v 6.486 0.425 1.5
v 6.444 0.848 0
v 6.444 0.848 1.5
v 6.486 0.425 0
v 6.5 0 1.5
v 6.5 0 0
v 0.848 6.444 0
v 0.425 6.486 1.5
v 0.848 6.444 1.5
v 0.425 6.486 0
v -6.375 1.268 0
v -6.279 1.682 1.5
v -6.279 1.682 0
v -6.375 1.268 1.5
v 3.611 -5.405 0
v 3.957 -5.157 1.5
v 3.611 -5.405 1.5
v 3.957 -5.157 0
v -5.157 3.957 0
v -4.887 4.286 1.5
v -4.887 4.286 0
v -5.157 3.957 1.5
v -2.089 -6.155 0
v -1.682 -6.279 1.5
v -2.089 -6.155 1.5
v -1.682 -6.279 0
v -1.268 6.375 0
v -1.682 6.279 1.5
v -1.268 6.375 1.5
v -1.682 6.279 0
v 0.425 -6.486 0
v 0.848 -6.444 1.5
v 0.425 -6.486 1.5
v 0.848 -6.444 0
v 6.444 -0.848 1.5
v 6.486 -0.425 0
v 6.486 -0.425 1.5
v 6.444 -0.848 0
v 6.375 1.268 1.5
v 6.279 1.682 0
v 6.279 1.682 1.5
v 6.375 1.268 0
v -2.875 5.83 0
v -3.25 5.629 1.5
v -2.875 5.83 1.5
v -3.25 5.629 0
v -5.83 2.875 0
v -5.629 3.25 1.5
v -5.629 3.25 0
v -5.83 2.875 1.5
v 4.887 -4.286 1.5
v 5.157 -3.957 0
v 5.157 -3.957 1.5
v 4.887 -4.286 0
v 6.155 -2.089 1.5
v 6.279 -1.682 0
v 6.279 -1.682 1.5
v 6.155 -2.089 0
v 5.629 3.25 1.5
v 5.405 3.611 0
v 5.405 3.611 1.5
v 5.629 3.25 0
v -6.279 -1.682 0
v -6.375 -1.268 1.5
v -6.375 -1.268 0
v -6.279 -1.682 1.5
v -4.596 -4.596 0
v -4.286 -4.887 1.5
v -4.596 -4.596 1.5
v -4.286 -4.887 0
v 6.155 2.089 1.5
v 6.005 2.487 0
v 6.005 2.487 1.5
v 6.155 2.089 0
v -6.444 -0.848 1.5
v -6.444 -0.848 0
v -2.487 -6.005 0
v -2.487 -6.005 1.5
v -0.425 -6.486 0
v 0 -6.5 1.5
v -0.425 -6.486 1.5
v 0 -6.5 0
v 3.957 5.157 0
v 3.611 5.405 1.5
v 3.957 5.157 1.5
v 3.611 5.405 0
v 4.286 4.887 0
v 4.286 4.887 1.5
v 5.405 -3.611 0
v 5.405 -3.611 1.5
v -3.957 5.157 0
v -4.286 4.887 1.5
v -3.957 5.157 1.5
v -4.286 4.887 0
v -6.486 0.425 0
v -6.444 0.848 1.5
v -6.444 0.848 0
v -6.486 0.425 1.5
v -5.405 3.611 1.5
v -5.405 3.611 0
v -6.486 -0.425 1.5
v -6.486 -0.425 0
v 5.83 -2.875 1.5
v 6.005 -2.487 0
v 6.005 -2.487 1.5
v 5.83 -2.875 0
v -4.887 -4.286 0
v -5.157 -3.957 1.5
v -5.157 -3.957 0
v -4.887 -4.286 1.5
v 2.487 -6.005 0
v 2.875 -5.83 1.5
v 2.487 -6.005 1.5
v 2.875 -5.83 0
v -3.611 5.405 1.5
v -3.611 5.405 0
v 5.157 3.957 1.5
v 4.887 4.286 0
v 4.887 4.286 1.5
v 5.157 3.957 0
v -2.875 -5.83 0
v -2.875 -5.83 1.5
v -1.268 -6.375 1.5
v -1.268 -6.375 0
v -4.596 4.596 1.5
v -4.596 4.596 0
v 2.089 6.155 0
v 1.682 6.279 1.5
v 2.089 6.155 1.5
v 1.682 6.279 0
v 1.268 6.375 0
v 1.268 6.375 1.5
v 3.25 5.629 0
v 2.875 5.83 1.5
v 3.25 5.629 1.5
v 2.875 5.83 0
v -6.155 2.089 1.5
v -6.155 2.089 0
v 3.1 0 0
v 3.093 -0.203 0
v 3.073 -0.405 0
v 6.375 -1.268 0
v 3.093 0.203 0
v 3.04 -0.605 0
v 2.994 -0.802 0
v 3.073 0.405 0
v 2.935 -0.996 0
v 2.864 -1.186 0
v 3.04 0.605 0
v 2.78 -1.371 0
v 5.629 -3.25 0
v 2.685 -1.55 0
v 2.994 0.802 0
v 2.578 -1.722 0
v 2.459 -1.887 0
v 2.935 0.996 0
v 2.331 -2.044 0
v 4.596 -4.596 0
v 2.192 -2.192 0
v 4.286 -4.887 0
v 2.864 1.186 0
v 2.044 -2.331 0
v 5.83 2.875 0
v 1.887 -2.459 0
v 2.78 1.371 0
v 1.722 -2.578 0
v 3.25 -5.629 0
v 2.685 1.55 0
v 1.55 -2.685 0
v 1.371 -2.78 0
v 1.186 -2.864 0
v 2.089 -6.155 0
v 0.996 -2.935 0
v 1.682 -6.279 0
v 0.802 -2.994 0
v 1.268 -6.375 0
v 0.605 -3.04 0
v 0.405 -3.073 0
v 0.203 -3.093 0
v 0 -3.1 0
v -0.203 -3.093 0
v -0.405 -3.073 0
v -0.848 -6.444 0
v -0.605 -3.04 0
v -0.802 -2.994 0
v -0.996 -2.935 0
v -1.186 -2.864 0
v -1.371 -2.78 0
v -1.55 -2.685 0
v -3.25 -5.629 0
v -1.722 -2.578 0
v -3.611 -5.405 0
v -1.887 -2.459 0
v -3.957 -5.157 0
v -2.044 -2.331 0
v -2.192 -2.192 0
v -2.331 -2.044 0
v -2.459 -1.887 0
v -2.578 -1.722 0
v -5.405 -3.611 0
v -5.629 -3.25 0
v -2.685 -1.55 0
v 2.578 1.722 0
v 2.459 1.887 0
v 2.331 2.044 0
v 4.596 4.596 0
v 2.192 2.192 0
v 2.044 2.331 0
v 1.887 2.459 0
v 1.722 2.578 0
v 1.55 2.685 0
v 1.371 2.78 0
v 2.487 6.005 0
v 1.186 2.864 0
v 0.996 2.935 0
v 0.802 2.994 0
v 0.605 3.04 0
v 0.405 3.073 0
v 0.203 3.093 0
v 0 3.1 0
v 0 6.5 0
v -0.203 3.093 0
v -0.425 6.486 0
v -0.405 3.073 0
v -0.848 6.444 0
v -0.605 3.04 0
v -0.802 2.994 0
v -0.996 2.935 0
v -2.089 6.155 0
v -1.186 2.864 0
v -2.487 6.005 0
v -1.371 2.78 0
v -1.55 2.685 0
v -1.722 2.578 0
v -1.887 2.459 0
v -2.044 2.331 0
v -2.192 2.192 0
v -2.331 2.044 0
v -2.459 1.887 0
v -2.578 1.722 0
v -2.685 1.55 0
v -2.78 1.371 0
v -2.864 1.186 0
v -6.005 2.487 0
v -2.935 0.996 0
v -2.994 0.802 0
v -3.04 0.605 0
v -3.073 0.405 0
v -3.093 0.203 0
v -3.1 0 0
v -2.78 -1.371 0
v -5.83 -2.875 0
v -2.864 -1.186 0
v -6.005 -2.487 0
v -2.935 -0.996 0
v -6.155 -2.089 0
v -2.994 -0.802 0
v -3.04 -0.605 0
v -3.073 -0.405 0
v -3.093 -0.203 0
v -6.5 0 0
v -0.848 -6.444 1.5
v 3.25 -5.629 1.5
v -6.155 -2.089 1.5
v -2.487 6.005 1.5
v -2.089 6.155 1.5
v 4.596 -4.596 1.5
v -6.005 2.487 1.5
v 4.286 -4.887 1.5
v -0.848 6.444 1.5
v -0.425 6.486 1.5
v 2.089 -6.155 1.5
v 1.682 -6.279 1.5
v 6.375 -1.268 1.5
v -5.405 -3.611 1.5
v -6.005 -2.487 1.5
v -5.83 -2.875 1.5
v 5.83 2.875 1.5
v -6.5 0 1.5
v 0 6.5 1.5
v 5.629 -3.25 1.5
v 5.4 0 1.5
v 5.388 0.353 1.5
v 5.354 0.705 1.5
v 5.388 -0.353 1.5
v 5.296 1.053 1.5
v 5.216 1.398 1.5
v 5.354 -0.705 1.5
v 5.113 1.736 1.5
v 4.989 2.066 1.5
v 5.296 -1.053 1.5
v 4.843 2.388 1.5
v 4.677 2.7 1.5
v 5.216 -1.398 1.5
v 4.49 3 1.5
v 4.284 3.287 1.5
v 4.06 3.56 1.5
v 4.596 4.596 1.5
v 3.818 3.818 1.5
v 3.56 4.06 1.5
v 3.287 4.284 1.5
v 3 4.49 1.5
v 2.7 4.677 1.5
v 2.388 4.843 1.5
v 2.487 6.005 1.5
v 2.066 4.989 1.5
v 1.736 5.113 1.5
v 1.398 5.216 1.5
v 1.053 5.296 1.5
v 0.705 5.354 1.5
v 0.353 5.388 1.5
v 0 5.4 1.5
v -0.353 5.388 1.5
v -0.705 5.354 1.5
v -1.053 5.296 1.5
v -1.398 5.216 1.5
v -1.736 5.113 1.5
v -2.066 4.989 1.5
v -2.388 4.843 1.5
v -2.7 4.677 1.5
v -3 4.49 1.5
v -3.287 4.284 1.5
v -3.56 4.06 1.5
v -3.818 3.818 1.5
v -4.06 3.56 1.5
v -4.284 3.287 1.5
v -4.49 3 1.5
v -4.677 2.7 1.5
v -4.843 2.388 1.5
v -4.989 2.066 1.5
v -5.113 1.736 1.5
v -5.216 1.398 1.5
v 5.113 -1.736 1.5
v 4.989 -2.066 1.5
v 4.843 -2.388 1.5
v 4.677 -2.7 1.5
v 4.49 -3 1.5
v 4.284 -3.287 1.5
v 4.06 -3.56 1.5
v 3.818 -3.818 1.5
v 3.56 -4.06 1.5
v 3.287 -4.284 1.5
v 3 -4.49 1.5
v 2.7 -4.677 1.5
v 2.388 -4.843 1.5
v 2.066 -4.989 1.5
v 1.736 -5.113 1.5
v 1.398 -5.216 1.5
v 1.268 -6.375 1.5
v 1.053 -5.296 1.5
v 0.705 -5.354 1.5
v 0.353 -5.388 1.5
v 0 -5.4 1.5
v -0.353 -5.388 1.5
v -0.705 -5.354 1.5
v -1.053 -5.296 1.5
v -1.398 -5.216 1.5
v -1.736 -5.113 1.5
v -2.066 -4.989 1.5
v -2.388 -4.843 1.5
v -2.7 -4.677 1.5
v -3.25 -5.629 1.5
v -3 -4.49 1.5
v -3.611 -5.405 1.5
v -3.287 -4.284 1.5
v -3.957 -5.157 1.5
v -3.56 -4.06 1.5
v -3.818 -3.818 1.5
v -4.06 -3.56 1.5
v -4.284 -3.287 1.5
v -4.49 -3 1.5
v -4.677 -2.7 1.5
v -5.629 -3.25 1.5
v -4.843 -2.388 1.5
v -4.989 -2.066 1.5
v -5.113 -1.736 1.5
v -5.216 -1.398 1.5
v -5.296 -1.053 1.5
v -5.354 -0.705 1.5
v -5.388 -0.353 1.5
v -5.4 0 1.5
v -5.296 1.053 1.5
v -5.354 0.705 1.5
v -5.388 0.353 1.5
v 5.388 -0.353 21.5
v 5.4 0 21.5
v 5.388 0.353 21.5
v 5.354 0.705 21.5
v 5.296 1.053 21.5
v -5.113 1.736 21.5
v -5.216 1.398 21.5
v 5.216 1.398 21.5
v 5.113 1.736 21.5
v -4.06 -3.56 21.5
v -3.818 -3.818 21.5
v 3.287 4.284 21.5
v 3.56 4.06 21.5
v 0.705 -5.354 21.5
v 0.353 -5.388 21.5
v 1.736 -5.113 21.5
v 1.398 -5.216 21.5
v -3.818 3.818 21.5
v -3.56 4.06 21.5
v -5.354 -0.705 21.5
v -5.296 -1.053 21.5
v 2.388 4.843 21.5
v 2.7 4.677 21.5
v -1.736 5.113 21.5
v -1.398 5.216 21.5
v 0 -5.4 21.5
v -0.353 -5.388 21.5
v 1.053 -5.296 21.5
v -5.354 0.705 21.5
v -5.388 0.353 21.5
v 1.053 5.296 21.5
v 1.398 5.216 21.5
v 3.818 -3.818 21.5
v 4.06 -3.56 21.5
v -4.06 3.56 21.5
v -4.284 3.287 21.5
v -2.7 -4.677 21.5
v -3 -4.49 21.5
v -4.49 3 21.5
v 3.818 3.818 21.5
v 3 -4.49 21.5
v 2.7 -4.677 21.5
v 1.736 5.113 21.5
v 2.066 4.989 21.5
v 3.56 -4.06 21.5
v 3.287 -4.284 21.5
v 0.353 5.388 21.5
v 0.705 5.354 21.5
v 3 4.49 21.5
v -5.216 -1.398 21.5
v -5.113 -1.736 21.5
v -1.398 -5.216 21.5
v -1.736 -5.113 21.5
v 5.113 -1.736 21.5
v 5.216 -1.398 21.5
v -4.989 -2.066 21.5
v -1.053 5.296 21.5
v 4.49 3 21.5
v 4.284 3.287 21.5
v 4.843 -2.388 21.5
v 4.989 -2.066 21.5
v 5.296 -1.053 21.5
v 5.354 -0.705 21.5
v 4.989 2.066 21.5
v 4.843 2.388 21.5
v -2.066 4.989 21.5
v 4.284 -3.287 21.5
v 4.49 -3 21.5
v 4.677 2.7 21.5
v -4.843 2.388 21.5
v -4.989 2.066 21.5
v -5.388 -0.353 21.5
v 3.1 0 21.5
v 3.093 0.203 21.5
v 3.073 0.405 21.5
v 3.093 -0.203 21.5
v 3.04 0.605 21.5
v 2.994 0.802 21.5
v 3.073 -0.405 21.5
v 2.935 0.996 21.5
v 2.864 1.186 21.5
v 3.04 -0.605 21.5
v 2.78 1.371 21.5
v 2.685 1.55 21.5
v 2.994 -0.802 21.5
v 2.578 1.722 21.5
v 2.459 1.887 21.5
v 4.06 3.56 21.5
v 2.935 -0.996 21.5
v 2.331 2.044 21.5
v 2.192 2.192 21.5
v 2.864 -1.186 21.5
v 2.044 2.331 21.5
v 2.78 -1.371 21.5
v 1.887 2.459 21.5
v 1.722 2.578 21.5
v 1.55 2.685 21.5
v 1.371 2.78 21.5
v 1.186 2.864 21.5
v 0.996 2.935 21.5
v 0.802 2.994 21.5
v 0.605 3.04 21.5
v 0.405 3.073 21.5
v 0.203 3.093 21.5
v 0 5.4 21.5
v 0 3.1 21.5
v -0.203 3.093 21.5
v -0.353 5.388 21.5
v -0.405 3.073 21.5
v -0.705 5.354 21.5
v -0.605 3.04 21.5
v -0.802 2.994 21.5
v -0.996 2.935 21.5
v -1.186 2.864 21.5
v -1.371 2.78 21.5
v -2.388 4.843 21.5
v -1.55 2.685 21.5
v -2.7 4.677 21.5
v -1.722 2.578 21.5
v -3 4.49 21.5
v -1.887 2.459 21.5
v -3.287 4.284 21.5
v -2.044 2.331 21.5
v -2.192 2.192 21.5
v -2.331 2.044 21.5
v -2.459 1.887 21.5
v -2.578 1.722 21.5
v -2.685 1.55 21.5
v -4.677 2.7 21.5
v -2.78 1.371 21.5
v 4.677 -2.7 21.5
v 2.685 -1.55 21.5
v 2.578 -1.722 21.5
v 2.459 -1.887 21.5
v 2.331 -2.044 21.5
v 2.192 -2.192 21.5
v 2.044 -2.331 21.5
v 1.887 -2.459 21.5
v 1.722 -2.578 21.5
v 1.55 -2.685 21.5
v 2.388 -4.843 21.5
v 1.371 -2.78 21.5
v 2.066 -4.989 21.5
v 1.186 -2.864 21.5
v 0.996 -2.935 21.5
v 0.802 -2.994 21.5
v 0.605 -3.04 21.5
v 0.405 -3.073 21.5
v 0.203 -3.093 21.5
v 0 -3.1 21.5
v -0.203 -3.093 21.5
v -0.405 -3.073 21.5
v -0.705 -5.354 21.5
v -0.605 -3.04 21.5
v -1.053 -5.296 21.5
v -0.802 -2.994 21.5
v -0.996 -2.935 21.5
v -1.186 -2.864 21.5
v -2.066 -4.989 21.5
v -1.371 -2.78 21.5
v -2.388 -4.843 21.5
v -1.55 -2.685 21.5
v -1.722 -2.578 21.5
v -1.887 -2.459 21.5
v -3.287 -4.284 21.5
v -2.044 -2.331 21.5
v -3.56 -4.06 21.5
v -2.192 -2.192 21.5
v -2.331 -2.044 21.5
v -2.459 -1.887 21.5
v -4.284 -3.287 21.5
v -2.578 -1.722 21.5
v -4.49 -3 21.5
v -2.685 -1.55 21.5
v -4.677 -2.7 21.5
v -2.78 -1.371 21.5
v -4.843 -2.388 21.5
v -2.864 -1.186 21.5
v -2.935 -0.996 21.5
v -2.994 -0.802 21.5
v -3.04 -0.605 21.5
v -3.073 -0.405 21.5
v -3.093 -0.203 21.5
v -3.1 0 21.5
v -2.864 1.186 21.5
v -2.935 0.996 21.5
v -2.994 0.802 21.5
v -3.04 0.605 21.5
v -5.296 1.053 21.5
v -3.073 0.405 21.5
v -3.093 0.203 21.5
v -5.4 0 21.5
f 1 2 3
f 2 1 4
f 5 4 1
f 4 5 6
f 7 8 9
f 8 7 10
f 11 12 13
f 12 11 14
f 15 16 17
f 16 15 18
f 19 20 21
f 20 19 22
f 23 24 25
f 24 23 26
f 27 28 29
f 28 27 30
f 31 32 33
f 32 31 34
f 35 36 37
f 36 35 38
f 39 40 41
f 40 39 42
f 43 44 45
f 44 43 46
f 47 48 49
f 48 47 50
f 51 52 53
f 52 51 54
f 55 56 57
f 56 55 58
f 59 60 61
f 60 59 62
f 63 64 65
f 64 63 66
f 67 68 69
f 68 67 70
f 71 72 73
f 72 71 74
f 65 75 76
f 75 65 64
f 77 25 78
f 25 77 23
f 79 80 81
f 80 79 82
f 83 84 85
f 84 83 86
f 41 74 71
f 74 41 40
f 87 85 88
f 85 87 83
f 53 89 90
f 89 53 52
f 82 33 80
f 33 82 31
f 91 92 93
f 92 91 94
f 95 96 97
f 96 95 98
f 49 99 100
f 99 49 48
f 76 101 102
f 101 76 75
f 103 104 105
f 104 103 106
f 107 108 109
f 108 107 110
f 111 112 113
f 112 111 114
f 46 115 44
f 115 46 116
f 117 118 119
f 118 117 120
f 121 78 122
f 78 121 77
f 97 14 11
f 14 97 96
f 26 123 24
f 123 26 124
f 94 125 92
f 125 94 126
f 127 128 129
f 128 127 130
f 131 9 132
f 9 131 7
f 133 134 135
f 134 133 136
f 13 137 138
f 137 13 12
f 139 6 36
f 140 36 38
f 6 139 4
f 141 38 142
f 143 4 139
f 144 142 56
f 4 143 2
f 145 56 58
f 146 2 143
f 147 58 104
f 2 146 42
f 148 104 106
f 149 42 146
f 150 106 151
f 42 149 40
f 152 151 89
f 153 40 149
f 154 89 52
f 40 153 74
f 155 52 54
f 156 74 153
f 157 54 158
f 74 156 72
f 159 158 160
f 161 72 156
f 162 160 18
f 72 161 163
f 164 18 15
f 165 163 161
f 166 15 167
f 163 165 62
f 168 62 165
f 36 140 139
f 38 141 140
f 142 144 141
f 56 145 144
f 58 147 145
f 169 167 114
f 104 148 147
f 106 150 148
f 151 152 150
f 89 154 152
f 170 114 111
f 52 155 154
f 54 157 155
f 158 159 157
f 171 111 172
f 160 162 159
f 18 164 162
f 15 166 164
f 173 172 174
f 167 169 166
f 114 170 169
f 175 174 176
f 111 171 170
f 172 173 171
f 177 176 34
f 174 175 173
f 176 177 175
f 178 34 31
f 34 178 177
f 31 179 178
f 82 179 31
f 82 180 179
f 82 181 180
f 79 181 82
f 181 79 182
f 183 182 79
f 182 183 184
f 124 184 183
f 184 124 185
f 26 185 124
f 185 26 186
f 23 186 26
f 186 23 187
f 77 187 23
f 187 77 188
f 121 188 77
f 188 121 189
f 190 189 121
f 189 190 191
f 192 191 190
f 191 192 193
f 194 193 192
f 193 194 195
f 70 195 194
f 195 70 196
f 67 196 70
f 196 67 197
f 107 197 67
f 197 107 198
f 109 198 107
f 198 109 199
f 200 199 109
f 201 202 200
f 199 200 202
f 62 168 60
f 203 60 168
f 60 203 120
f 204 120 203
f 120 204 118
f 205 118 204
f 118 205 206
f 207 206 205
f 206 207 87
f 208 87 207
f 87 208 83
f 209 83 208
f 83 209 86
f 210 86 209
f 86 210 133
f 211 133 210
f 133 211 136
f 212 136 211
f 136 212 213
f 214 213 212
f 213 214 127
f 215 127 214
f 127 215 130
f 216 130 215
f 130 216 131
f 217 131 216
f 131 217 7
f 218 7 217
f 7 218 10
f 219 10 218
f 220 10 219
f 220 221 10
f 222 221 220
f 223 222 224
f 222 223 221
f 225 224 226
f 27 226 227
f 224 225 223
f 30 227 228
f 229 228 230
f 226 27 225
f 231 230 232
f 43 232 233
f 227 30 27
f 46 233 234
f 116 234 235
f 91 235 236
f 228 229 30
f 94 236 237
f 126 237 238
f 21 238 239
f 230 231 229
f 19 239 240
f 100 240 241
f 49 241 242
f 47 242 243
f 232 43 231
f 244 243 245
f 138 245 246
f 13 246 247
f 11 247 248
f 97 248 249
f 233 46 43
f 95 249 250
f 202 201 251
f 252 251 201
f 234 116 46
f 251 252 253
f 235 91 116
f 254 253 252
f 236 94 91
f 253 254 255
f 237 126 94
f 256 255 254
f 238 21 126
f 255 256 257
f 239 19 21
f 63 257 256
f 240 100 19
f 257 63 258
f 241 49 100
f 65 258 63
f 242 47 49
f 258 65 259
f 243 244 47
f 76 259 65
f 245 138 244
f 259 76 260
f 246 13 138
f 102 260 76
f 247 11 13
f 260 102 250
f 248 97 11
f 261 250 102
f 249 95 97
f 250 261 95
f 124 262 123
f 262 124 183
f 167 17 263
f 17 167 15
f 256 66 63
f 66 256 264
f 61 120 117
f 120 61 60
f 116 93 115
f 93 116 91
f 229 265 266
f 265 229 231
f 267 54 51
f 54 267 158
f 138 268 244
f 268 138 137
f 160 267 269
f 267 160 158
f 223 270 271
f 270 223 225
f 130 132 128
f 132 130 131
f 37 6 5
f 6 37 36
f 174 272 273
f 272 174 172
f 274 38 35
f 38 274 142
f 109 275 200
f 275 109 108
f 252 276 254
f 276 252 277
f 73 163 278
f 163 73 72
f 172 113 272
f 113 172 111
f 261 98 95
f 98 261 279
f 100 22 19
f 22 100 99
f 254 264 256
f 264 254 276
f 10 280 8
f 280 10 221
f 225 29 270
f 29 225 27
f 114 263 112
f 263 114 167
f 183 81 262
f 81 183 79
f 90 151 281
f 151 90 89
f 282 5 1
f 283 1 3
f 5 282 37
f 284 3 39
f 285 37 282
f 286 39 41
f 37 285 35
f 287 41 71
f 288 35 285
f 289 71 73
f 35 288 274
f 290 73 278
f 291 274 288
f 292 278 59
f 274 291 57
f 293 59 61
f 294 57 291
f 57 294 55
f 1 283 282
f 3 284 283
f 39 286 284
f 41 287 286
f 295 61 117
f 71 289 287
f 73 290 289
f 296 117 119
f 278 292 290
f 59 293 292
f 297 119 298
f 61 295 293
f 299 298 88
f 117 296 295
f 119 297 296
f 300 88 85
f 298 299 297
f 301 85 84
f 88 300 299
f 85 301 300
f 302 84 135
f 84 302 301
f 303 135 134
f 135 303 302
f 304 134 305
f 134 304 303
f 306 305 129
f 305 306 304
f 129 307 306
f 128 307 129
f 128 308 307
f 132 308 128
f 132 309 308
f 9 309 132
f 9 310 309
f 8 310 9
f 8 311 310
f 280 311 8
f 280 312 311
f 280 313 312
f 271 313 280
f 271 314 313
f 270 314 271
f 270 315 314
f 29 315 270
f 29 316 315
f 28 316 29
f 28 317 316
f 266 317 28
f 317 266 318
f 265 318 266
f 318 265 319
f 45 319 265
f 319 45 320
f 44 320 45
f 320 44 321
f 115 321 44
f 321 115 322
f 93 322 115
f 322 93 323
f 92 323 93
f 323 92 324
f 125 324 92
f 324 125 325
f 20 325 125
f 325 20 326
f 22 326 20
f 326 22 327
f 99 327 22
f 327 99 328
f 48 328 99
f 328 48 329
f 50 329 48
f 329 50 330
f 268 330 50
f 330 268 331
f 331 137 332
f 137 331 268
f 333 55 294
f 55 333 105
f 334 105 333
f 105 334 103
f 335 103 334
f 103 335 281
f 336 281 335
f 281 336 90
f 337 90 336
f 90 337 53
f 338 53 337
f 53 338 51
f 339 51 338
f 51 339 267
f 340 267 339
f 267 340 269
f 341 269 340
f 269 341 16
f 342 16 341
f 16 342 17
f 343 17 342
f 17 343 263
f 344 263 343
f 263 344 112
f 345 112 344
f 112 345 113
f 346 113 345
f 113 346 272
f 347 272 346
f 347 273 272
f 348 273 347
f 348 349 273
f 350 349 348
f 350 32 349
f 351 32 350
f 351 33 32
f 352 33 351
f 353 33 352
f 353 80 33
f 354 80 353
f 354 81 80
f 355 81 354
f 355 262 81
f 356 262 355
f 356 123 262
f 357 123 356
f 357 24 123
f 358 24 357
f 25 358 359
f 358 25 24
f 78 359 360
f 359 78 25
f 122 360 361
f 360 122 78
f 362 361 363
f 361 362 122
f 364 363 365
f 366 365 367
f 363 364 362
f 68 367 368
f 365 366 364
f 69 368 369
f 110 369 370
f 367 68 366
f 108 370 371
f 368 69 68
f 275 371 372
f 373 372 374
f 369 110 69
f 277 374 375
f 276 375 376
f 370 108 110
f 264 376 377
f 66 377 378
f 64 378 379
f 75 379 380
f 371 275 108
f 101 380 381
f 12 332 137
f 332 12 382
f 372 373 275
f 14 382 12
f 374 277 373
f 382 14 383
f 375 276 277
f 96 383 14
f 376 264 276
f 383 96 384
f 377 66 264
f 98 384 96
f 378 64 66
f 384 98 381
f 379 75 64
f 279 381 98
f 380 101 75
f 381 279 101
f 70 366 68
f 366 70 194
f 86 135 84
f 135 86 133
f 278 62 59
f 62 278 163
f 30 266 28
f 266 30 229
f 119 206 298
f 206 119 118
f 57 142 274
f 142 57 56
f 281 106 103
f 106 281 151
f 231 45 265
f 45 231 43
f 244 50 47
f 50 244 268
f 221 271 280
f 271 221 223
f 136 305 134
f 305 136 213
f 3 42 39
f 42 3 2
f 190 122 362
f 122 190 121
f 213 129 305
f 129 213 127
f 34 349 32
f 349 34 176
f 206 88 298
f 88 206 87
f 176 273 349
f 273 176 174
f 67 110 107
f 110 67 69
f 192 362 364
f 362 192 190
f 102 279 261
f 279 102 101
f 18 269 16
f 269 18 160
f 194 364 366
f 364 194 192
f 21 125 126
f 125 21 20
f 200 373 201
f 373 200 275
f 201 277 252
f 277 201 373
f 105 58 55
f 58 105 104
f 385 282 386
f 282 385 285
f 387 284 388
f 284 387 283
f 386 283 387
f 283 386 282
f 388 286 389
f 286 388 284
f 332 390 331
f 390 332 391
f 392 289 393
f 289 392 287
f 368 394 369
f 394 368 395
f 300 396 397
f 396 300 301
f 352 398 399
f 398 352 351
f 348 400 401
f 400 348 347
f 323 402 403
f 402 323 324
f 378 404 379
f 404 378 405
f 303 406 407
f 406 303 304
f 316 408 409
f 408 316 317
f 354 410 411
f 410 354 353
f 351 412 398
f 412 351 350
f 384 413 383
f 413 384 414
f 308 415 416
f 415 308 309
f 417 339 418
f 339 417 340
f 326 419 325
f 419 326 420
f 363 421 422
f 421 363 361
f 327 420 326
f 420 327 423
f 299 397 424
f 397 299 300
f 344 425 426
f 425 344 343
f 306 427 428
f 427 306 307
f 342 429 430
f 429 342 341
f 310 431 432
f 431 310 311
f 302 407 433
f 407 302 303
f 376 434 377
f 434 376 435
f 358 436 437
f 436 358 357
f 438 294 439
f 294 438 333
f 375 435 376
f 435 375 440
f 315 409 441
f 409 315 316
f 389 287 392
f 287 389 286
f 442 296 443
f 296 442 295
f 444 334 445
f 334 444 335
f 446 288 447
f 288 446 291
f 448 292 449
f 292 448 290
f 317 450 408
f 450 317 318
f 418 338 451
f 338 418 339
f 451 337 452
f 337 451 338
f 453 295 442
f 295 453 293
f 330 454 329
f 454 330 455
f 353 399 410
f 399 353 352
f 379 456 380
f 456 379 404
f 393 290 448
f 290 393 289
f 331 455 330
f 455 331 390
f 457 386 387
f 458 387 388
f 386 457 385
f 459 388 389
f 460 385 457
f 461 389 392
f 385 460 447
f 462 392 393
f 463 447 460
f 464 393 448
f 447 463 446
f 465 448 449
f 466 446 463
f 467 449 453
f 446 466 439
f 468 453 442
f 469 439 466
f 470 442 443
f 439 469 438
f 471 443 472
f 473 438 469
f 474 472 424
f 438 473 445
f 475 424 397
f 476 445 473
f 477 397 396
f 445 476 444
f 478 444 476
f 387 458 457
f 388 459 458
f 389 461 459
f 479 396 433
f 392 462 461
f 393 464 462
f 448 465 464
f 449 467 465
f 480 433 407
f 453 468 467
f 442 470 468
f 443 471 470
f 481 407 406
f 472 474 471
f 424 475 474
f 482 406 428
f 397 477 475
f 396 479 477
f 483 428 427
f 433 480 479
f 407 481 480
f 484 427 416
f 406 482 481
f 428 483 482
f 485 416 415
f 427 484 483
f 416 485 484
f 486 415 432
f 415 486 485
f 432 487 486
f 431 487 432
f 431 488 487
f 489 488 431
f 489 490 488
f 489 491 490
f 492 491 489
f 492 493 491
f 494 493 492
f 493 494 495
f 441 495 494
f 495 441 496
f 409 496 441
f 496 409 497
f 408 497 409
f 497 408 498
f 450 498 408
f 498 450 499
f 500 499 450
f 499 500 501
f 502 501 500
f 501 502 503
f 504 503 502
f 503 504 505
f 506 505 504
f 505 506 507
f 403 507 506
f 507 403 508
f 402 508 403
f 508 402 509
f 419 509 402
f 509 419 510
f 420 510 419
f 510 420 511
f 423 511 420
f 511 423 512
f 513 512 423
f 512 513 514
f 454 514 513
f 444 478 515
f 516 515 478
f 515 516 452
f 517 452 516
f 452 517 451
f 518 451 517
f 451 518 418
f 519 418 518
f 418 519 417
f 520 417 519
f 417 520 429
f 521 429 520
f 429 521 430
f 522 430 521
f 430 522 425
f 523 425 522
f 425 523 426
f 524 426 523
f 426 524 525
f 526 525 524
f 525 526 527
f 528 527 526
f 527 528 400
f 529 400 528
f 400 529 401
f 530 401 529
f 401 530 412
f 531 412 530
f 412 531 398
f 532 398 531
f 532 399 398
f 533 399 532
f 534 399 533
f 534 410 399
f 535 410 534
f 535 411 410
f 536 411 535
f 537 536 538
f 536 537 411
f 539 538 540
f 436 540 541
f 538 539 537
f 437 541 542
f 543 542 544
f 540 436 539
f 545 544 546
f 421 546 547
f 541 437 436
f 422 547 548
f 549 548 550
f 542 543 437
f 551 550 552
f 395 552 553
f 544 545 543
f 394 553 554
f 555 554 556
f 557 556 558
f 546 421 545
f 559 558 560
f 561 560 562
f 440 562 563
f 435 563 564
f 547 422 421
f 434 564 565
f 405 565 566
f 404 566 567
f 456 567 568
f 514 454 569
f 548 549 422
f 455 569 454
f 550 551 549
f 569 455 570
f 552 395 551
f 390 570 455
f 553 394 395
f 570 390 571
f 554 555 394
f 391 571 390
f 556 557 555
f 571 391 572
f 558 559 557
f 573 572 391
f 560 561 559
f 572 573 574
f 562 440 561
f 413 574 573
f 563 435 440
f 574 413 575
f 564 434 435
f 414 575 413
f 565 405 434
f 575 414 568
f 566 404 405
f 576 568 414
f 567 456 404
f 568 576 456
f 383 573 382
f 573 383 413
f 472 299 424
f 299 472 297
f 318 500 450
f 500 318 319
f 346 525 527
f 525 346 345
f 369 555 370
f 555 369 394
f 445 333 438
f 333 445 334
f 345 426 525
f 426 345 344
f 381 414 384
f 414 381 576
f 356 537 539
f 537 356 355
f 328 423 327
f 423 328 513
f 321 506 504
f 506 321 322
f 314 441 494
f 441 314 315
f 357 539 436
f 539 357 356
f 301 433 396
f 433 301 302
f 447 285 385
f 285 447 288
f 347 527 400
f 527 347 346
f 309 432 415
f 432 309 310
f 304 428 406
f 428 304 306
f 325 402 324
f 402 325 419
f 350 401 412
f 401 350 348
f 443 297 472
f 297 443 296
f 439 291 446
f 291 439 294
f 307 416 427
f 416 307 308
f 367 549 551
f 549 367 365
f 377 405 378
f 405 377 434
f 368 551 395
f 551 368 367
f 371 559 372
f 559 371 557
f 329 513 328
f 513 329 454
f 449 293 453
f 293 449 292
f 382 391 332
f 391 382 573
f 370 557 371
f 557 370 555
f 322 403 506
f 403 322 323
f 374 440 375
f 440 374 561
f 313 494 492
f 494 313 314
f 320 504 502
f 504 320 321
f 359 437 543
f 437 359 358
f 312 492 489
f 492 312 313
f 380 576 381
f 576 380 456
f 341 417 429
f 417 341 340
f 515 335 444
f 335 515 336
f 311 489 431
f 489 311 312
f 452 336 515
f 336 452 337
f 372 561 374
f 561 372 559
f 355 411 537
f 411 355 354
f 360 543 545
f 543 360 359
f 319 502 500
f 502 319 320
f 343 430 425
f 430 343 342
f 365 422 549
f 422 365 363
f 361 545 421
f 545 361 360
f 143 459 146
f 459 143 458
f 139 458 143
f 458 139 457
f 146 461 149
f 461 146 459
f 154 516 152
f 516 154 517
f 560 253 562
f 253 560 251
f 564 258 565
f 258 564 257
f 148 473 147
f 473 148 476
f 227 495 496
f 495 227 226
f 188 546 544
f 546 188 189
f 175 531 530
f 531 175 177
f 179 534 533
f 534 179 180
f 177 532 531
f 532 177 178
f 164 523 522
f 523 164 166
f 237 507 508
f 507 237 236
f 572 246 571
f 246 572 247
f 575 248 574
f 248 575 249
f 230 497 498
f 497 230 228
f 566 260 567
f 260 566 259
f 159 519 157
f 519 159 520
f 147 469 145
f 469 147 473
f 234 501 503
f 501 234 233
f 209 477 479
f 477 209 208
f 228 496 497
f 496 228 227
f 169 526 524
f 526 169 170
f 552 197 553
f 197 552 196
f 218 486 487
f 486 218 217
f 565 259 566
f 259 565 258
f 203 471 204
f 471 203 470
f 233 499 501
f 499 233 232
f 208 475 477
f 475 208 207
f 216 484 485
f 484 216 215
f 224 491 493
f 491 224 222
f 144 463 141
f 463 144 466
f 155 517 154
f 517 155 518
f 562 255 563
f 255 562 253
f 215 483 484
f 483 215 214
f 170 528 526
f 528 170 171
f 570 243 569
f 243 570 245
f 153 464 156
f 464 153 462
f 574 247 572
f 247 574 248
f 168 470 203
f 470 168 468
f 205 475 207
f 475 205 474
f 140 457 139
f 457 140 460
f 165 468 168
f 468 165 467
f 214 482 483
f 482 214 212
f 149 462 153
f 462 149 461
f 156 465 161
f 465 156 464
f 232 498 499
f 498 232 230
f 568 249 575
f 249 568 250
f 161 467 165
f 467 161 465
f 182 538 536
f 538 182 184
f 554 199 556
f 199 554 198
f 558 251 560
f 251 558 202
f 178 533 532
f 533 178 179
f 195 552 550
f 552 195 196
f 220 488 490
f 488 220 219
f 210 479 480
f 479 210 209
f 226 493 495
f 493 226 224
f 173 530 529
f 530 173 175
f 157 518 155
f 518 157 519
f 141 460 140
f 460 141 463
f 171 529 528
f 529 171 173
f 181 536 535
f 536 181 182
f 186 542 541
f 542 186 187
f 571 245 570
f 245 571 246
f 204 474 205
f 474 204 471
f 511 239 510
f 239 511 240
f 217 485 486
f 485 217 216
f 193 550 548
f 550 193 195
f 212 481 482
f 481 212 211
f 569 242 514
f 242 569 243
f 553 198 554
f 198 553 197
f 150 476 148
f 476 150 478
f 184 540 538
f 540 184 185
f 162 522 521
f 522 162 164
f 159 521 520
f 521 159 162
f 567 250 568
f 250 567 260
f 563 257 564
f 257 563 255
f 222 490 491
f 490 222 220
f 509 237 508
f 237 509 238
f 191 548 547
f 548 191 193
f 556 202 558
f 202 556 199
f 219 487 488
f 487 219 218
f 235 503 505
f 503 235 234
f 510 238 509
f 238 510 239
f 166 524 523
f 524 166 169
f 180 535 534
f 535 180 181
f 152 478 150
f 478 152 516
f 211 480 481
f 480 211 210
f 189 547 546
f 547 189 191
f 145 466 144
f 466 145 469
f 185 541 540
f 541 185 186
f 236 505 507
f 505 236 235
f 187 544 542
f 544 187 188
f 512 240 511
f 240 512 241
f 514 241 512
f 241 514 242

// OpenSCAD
// PCR tube adapter sleeve: fits a 0.2 mL tube in a 1.5 mL rack hole
// Print orientation: collar on the bed (z = 0), sleeve body rises to z = 21.5

// ---------------- Parameters ----------------
collar_d      = 13;     // collar outer diameter (on the bed)
collar_t      = 1.5;    // collar thickness (z = 0 to 1.5)
sleeve_d      = 10.8;   // sleeve body outer diameter
sleeve_h      = 20;     // sleeve body height above the collar (z = 1.5 to 21.5)
bore_d        = 6.2;    // through-bore diameter (open at both ends)
eps           = 0.5;    // cutter overshoot past faces
$fn           = 96;     // curve resolution

// Derived
sleeve_top_z  = collar_t + sleeve_h;   // 21.5 mm

// ---------------- Model ----------------
difference() {
    union() {
        // Collar lying on the bed
        cylinder(d = collar_d, h = collar_t);

        // Sleeve body rising from the collar
        translate([0, 0, collar_t])
            cylinder(d = sleeve_d, h = sleeve_h);
    }

    // Straight through-bore
    translate([0, 0, -eps])
        cylinder(d = bore_d, h = sleeve_top_z + 2 * eps);
}
